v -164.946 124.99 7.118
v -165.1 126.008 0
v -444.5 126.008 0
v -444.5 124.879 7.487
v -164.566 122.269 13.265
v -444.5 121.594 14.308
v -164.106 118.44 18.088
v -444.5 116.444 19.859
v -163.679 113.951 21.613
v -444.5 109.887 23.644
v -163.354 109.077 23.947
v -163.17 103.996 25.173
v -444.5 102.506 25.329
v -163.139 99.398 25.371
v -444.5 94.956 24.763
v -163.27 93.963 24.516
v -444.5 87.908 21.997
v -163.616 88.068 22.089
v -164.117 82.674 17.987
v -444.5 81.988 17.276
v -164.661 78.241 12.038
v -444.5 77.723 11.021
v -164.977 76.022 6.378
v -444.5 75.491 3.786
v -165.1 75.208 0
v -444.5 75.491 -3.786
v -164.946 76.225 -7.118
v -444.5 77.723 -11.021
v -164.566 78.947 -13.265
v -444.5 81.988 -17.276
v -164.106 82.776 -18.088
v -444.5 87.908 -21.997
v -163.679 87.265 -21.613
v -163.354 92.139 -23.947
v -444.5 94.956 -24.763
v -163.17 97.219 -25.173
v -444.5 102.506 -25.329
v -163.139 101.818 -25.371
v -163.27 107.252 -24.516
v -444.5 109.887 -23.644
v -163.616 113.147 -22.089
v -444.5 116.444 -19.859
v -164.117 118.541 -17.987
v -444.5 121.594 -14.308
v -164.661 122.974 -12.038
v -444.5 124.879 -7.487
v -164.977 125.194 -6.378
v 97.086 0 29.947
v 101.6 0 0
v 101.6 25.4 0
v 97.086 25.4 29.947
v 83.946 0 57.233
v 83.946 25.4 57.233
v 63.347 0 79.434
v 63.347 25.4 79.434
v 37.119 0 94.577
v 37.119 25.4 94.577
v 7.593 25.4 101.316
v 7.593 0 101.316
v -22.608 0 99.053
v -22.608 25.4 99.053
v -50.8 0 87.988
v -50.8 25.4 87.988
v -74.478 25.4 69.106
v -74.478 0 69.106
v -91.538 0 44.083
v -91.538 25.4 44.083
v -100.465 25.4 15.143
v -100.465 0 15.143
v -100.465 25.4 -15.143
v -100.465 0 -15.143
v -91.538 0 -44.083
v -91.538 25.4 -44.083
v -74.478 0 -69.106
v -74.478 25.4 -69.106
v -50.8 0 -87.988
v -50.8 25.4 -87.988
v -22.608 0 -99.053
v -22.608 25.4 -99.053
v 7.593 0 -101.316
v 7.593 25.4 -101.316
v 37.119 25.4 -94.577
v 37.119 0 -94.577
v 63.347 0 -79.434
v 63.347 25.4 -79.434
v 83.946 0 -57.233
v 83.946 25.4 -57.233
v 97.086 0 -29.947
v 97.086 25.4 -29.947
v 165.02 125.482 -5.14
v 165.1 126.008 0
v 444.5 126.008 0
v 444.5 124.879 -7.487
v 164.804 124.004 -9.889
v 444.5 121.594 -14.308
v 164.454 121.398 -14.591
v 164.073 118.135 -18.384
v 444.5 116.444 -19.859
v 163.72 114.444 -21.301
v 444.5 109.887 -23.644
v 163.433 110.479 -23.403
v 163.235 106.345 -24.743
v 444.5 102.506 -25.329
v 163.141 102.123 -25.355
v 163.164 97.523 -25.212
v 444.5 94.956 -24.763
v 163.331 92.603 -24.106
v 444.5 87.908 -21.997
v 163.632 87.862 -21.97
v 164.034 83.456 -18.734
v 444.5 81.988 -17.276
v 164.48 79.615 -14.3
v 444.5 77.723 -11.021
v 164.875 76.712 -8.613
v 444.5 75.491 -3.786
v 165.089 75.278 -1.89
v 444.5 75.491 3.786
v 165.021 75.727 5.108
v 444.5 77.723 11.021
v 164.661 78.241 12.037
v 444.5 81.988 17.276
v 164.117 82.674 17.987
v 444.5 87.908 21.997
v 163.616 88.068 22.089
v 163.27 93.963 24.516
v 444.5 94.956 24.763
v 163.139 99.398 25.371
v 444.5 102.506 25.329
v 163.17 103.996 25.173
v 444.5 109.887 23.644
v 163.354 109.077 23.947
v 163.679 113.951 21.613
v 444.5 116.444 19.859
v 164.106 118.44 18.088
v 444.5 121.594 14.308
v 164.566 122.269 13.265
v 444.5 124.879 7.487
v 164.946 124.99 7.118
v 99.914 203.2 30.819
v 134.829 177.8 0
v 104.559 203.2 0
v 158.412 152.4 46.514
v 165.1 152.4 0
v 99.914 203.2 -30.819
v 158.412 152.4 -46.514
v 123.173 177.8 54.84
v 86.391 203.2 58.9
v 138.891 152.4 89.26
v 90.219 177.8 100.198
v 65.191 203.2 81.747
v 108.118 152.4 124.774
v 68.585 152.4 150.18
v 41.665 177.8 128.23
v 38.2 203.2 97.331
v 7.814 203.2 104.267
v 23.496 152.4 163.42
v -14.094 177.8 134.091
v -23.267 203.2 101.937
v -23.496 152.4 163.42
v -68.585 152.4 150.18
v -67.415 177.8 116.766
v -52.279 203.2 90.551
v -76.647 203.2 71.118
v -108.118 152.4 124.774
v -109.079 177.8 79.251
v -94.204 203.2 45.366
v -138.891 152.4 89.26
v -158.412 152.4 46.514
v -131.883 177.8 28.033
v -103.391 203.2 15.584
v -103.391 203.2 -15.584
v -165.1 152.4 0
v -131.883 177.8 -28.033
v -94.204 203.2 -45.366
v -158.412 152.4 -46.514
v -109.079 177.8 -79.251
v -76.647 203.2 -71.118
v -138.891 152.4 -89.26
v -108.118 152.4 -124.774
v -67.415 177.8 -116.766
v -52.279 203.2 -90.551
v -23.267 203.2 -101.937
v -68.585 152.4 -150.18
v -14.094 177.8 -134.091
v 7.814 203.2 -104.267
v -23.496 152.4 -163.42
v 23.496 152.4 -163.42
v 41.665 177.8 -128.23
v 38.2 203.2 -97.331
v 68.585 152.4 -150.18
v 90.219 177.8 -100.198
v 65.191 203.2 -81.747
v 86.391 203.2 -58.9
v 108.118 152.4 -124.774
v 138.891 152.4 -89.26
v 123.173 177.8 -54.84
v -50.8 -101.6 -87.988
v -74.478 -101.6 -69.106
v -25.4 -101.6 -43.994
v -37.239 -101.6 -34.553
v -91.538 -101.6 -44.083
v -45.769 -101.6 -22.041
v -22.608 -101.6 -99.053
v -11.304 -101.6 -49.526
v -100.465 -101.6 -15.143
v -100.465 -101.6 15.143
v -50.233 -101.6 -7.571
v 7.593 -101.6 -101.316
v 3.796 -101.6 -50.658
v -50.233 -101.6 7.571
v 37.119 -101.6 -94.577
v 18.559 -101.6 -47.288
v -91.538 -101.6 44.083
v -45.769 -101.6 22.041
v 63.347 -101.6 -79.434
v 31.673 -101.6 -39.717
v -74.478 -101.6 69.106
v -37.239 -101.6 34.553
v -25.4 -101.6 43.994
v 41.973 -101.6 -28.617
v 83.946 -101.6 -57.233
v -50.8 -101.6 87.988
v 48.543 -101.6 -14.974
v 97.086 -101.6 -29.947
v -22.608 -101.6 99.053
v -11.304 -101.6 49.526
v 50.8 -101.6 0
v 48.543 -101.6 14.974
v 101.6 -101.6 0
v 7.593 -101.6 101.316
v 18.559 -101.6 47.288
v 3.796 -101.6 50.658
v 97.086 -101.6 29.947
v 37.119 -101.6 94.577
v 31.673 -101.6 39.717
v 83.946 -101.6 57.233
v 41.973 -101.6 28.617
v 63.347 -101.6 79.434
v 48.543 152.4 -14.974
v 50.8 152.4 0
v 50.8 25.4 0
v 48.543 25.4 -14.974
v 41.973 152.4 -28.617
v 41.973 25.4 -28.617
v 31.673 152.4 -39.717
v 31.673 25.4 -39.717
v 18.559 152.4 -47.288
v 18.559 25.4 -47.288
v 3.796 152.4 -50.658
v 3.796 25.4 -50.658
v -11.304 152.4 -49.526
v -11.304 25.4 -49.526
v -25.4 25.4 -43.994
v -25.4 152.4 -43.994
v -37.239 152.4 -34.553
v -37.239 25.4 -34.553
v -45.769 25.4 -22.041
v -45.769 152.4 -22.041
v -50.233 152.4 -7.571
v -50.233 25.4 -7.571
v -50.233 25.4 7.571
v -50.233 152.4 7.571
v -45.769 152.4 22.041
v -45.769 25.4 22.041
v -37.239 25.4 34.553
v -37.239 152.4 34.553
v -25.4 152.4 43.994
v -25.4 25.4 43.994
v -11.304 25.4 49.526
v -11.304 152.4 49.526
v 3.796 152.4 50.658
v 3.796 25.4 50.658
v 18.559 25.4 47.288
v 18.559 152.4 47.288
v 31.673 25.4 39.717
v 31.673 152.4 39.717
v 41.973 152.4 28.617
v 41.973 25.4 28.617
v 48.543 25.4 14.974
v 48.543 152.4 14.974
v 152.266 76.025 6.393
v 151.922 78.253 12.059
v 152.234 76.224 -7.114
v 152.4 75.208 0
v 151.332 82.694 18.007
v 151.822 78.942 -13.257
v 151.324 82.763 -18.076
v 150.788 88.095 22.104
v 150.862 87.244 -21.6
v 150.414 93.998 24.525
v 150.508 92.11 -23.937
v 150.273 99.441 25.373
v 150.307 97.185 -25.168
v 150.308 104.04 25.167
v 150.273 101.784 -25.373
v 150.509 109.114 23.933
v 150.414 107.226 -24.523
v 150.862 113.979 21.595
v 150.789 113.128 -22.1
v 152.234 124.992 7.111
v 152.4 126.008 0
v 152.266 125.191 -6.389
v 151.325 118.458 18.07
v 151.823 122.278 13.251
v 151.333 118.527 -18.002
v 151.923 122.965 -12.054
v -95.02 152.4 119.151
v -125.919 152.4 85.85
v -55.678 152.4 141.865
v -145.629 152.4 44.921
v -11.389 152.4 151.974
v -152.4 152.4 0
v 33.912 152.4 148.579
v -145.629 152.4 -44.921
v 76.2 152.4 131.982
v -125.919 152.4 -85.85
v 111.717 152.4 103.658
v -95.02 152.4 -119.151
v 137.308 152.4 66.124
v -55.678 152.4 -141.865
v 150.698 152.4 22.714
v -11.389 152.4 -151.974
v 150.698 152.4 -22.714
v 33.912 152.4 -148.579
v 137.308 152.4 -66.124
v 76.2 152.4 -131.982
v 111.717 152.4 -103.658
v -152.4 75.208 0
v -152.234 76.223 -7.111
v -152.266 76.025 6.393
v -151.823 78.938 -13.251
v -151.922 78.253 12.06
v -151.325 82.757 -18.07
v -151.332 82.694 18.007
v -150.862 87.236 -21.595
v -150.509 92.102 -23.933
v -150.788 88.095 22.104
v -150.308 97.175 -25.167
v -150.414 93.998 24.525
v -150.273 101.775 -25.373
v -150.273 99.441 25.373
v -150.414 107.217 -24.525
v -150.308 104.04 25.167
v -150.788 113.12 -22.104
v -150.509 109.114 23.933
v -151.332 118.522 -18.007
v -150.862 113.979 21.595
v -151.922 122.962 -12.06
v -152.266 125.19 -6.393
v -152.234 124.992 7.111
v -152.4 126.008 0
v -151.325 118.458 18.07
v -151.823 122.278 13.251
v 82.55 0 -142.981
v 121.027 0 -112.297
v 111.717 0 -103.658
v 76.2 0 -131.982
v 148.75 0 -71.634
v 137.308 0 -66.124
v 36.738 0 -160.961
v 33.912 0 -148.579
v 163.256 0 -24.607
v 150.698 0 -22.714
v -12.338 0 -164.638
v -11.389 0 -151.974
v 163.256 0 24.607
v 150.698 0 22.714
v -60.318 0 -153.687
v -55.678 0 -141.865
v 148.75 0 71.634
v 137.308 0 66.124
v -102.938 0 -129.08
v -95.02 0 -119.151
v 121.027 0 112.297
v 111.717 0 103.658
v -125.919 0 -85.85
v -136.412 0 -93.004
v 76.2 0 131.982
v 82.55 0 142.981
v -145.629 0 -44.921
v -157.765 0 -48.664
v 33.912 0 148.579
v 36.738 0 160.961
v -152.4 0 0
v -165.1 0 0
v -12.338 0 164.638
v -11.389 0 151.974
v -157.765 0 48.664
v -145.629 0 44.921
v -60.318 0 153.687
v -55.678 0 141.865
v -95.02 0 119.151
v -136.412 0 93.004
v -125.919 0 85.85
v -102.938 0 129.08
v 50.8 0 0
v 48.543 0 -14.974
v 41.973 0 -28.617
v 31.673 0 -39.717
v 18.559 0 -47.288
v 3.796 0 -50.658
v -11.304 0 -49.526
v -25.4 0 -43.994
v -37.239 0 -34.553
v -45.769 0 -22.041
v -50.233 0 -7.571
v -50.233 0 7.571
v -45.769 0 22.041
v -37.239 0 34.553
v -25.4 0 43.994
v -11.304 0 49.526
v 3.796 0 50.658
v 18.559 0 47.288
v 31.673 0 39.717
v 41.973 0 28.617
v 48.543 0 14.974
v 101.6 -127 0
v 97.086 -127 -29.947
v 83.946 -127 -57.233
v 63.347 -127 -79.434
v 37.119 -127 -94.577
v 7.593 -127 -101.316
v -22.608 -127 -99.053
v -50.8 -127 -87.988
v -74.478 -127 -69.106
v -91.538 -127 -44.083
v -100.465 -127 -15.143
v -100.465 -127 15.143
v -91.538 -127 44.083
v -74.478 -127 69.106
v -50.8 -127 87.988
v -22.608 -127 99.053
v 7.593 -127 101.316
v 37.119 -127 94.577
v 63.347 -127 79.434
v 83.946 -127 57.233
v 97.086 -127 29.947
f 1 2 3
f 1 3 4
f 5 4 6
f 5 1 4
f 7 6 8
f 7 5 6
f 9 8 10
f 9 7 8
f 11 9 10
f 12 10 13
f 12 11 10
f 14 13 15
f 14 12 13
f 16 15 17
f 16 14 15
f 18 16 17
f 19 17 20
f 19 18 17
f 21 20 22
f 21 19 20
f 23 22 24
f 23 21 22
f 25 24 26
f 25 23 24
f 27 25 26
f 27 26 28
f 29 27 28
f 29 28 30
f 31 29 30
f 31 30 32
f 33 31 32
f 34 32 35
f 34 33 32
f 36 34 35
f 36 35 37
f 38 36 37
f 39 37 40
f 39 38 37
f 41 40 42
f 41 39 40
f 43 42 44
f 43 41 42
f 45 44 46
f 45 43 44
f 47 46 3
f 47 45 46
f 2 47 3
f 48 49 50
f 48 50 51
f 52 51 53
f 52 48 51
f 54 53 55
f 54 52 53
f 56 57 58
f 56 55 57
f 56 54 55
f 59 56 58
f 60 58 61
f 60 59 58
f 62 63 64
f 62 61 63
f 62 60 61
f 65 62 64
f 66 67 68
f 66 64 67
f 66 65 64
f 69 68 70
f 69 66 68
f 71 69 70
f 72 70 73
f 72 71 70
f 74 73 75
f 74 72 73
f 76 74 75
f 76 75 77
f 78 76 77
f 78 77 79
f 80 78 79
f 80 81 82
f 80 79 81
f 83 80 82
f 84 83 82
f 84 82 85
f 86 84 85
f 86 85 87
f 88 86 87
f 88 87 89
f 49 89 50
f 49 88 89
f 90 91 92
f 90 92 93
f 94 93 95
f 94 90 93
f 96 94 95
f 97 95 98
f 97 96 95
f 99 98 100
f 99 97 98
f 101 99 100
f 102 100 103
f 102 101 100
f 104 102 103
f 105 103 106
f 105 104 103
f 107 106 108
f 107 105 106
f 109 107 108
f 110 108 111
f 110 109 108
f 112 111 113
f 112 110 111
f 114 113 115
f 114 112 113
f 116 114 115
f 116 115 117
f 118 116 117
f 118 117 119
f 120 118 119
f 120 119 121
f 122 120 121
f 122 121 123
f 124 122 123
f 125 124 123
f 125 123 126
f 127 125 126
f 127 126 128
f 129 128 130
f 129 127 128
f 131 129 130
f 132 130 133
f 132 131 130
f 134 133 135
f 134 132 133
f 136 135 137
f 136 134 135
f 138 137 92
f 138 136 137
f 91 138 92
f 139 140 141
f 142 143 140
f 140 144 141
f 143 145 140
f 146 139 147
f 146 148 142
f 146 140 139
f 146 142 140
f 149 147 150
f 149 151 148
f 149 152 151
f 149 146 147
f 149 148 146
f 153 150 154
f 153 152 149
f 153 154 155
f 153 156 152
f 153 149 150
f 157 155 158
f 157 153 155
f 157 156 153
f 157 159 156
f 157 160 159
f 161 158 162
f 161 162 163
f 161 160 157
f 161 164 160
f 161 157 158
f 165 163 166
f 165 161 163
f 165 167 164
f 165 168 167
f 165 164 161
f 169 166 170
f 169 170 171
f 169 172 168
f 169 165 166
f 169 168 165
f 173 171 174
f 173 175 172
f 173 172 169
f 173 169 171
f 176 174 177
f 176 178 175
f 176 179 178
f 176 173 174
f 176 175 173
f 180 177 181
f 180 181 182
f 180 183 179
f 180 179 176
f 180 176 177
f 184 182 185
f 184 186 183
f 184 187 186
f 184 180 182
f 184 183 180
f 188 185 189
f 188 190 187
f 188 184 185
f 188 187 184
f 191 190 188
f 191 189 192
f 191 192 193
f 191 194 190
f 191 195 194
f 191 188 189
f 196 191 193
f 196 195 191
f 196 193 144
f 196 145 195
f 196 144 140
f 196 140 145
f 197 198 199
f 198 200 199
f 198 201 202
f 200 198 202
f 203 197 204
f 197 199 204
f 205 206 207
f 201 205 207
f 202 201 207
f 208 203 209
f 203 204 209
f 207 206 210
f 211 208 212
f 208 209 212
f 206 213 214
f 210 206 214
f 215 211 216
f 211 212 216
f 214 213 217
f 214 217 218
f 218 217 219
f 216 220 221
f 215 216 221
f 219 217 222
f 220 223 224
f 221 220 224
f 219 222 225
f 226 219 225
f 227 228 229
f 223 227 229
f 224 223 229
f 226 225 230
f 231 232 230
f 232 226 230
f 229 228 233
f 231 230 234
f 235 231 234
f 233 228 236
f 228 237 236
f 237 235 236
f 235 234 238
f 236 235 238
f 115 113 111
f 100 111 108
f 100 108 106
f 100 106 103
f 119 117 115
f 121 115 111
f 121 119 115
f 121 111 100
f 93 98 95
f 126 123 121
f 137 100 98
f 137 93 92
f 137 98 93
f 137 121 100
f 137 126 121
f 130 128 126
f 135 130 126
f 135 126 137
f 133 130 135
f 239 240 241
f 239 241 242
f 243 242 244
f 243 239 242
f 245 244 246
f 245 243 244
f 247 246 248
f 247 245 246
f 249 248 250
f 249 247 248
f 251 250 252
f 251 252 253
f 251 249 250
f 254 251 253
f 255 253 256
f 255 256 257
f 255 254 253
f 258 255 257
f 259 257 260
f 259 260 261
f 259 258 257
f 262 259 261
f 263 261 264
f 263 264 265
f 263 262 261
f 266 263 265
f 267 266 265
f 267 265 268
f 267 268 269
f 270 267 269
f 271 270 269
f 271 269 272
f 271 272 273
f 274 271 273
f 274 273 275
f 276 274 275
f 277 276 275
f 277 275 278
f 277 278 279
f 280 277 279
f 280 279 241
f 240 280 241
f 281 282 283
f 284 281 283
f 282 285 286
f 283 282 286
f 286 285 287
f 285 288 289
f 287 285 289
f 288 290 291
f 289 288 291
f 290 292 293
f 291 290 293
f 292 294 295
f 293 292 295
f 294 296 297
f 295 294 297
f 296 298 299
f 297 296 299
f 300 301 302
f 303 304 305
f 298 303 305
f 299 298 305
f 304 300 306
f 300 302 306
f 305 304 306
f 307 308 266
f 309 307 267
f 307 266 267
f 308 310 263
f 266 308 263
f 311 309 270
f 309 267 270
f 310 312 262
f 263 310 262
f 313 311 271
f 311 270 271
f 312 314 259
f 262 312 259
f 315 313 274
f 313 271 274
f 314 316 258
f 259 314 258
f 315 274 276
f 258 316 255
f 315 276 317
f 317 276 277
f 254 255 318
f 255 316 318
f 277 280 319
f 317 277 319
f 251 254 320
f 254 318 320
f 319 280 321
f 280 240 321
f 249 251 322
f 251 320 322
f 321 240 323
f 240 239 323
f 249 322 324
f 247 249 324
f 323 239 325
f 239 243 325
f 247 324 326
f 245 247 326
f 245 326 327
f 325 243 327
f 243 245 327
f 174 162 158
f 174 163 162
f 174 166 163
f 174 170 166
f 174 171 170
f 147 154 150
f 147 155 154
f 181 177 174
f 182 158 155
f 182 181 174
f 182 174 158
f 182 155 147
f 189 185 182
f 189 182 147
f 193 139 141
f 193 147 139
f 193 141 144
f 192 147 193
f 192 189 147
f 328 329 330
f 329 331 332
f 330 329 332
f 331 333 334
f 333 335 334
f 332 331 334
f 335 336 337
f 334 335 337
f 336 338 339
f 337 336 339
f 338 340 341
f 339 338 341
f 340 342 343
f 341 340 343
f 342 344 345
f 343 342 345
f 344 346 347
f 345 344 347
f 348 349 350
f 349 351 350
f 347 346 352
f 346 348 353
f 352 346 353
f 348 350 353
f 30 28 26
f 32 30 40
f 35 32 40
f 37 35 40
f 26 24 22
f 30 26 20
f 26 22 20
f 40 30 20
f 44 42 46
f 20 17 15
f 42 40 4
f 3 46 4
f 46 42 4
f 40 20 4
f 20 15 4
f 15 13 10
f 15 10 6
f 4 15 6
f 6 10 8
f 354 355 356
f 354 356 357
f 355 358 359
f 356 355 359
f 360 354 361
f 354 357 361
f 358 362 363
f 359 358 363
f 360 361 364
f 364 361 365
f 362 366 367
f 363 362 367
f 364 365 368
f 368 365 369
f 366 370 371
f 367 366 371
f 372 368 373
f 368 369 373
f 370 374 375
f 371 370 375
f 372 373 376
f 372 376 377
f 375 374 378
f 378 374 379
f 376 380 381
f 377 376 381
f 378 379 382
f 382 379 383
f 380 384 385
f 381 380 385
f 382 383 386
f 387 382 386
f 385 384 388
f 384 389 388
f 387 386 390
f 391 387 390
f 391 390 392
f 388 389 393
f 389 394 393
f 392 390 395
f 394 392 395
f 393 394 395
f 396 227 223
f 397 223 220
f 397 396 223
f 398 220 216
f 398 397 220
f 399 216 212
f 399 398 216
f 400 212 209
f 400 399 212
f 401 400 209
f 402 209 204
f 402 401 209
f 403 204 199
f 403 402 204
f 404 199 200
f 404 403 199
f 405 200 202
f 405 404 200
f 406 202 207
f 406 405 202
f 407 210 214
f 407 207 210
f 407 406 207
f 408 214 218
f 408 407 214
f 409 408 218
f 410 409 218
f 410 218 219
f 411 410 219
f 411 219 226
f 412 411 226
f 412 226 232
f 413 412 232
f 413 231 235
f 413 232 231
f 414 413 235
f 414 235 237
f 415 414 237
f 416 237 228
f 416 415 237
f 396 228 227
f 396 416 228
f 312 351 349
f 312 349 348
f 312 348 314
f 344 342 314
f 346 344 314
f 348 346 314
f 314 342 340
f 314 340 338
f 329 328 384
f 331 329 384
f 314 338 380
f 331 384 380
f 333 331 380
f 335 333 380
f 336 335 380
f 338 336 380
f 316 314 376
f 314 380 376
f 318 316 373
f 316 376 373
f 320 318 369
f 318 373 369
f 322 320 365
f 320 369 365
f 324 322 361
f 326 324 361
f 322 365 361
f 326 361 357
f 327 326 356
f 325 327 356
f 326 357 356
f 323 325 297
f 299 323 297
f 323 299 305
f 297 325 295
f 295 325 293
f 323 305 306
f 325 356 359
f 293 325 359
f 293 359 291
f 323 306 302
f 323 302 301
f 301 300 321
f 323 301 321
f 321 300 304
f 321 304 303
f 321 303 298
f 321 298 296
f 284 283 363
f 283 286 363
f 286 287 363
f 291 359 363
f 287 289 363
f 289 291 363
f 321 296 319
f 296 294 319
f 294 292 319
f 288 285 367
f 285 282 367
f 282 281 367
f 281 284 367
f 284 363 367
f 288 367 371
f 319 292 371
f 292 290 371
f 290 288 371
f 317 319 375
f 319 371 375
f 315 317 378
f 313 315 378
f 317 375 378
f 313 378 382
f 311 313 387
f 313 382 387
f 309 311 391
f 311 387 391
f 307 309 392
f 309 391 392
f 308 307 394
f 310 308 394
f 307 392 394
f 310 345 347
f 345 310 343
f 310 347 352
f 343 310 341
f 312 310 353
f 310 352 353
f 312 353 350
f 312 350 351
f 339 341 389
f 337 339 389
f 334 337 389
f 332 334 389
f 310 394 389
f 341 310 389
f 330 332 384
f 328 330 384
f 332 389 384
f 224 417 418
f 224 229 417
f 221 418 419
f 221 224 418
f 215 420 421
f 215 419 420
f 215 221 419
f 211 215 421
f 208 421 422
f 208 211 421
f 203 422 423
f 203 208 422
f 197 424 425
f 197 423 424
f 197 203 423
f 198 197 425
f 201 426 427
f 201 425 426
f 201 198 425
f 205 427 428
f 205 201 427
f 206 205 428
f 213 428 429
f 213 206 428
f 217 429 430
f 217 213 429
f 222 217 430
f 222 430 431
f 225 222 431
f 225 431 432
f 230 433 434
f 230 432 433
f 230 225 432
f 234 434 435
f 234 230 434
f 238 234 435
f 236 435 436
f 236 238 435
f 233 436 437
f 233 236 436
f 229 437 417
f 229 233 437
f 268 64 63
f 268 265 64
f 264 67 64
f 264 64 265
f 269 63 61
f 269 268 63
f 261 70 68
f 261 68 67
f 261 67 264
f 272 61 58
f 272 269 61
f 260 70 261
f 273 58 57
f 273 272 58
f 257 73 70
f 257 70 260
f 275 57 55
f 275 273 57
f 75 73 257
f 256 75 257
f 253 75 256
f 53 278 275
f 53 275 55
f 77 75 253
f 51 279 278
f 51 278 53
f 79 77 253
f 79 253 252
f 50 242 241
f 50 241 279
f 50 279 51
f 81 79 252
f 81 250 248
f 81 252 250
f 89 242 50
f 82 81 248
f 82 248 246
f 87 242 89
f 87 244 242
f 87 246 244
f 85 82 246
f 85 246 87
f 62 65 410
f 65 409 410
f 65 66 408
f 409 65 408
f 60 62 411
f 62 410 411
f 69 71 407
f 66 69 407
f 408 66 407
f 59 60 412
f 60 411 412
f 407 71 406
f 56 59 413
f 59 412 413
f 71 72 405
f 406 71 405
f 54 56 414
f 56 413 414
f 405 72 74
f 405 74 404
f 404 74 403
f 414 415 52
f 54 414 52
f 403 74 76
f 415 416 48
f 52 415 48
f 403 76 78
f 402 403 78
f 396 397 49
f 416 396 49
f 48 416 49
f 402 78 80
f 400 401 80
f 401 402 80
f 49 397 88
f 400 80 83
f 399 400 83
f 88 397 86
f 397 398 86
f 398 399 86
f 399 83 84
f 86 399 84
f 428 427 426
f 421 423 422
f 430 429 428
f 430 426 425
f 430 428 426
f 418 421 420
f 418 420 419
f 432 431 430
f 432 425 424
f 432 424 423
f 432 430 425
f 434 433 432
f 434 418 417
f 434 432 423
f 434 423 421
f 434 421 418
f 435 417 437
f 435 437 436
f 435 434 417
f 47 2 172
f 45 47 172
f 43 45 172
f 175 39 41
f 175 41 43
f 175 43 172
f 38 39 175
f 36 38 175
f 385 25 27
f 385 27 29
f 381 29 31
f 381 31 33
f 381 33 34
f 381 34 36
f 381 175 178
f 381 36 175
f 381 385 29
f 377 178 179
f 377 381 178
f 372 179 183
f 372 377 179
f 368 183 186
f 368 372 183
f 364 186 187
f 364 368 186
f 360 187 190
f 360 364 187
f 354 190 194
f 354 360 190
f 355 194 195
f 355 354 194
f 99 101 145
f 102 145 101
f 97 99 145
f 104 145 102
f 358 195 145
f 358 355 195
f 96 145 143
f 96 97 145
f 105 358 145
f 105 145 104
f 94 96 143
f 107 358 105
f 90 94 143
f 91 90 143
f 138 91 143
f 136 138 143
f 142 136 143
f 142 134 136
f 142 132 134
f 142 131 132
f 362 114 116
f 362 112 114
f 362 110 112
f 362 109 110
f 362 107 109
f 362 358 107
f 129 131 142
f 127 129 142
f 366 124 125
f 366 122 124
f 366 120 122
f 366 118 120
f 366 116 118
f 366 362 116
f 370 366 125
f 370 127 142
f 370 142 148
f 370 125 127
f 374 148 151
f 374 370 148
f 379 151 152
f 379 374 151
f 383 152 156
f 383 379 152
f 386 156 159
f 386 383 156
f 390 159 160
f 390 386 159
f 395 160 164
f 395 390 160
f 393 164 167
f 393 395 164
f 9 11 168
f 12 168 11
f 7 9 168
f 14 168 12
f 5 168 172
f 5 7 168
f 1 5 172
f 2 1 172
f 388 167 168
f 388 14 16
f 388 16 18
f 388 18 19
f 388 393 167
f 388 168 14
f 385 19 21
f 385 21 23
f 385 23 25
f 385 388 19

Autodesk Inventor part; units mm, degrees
ref_plane "YZ Plane" through (0, 0, 0) normal (1, 0, 0) x (0, 1, 0)
ref_plane "XZ Plane" through (0, 0, 0) normal (0, 1, 0) x (-1, 0, 0)
ref_plane "XY Plane" through (0, 0, 0) normal (0, 0, 1) x (1, 0, 0)
sketch "Sketch1" plane through (0, 0, 0) normal (0, 1, 0) x (-1, 0, 0)
  circle A0 centre (0, 0) radius 152.4
  circle A1 centre (0, 0) radius 165.1
  dimension "d0" = 304.8
  dimension "d1" = 330.2
extrude "Extrusion1" add sketch "Sketch1" along normal blind 152.4
sketch "Sketch2" plane through (0, 0, 0) normal (1, 0, 0) x (0, 1, 0)
  circle A0 centre (100.6077, 0) radius 25.4
  point P0 (0, 0)
  dimension "d4" = 50.8
extrude "Extrusion2" add sketch "Sketch2" along normal mid plane 889
sketch "Sketch4" plane through (0, 152.4, 0) normal (0, 1, 0) x (1, 0, 0)
  circle A0 centre (0, 0) radius 152.4
extrude "Extrusion4" cut sketch "Sketch4" against normal through all
sketch "Sketch5" plane through (0, 152.4, 0) normal (0, 1, 0) x (1, 0, 0)
  circle A0 centre (0, 0) radius 165.1
extrude "Extrusion5" add sketch "Sketch5" along normal blind 50.8 draft -50
sketch "Sketch6" plane through (0, 152.4, 0) normal (0, -1, 0) x (1, 0, 0)
  circle A0 centre (0, 0) radius 104.5589 projected
  circle A1 centre (0, 0) radius 50.8
  dimension "d15" = 101.6
extrude "Extrusion6" add sketch "Sketch6" along normal blind 254 contours A1
sketch "Sketch7" plane through (0, -101.6, 0) normal (0, -1, 0) x (1, 0, 0)
  circle A0 centre (0, 0) radius 104.5589 projected
  circle A1 centre (0, 0) radius 101.6
  dimension "d18" = 203.2
extrude "Extrusion7" add sketch "Sketch7" along normal blind 25.4 contours A1
ref_plane "Work Plane1" through (0, 0, 0) normal (0, 1, 0) x (1, 0, 0)
sketch "Sketch8" plane through (0, 0, 0) normal (0, 1, 0) x (1, 0, 0)
  circle A0 centre (0, 0) radius 101.6
  dimension "d22" = 203.2
extrude "Extrusion8" add sketch "Sketch8" along normal blind 25.4
ref_plane "Work Plane2" through (75.376, -18.8821, -44.9646) normal (1, 0, 0) x (0, 1, 0)
sketch "Sketch9" plane through (75.376, -18.8821, -44.9646) normal (1, 0, 0) x (0, 1, 0)
  circle A0 centre (-604.603, 44.9646) radius 12.7
  point P0 (18.8821, 44.9646)
  dimension "d25" = 25.4
extrude "Extrusion9" cut sketch "Sketch9" against normal through all
properties part number "capistan upper"
